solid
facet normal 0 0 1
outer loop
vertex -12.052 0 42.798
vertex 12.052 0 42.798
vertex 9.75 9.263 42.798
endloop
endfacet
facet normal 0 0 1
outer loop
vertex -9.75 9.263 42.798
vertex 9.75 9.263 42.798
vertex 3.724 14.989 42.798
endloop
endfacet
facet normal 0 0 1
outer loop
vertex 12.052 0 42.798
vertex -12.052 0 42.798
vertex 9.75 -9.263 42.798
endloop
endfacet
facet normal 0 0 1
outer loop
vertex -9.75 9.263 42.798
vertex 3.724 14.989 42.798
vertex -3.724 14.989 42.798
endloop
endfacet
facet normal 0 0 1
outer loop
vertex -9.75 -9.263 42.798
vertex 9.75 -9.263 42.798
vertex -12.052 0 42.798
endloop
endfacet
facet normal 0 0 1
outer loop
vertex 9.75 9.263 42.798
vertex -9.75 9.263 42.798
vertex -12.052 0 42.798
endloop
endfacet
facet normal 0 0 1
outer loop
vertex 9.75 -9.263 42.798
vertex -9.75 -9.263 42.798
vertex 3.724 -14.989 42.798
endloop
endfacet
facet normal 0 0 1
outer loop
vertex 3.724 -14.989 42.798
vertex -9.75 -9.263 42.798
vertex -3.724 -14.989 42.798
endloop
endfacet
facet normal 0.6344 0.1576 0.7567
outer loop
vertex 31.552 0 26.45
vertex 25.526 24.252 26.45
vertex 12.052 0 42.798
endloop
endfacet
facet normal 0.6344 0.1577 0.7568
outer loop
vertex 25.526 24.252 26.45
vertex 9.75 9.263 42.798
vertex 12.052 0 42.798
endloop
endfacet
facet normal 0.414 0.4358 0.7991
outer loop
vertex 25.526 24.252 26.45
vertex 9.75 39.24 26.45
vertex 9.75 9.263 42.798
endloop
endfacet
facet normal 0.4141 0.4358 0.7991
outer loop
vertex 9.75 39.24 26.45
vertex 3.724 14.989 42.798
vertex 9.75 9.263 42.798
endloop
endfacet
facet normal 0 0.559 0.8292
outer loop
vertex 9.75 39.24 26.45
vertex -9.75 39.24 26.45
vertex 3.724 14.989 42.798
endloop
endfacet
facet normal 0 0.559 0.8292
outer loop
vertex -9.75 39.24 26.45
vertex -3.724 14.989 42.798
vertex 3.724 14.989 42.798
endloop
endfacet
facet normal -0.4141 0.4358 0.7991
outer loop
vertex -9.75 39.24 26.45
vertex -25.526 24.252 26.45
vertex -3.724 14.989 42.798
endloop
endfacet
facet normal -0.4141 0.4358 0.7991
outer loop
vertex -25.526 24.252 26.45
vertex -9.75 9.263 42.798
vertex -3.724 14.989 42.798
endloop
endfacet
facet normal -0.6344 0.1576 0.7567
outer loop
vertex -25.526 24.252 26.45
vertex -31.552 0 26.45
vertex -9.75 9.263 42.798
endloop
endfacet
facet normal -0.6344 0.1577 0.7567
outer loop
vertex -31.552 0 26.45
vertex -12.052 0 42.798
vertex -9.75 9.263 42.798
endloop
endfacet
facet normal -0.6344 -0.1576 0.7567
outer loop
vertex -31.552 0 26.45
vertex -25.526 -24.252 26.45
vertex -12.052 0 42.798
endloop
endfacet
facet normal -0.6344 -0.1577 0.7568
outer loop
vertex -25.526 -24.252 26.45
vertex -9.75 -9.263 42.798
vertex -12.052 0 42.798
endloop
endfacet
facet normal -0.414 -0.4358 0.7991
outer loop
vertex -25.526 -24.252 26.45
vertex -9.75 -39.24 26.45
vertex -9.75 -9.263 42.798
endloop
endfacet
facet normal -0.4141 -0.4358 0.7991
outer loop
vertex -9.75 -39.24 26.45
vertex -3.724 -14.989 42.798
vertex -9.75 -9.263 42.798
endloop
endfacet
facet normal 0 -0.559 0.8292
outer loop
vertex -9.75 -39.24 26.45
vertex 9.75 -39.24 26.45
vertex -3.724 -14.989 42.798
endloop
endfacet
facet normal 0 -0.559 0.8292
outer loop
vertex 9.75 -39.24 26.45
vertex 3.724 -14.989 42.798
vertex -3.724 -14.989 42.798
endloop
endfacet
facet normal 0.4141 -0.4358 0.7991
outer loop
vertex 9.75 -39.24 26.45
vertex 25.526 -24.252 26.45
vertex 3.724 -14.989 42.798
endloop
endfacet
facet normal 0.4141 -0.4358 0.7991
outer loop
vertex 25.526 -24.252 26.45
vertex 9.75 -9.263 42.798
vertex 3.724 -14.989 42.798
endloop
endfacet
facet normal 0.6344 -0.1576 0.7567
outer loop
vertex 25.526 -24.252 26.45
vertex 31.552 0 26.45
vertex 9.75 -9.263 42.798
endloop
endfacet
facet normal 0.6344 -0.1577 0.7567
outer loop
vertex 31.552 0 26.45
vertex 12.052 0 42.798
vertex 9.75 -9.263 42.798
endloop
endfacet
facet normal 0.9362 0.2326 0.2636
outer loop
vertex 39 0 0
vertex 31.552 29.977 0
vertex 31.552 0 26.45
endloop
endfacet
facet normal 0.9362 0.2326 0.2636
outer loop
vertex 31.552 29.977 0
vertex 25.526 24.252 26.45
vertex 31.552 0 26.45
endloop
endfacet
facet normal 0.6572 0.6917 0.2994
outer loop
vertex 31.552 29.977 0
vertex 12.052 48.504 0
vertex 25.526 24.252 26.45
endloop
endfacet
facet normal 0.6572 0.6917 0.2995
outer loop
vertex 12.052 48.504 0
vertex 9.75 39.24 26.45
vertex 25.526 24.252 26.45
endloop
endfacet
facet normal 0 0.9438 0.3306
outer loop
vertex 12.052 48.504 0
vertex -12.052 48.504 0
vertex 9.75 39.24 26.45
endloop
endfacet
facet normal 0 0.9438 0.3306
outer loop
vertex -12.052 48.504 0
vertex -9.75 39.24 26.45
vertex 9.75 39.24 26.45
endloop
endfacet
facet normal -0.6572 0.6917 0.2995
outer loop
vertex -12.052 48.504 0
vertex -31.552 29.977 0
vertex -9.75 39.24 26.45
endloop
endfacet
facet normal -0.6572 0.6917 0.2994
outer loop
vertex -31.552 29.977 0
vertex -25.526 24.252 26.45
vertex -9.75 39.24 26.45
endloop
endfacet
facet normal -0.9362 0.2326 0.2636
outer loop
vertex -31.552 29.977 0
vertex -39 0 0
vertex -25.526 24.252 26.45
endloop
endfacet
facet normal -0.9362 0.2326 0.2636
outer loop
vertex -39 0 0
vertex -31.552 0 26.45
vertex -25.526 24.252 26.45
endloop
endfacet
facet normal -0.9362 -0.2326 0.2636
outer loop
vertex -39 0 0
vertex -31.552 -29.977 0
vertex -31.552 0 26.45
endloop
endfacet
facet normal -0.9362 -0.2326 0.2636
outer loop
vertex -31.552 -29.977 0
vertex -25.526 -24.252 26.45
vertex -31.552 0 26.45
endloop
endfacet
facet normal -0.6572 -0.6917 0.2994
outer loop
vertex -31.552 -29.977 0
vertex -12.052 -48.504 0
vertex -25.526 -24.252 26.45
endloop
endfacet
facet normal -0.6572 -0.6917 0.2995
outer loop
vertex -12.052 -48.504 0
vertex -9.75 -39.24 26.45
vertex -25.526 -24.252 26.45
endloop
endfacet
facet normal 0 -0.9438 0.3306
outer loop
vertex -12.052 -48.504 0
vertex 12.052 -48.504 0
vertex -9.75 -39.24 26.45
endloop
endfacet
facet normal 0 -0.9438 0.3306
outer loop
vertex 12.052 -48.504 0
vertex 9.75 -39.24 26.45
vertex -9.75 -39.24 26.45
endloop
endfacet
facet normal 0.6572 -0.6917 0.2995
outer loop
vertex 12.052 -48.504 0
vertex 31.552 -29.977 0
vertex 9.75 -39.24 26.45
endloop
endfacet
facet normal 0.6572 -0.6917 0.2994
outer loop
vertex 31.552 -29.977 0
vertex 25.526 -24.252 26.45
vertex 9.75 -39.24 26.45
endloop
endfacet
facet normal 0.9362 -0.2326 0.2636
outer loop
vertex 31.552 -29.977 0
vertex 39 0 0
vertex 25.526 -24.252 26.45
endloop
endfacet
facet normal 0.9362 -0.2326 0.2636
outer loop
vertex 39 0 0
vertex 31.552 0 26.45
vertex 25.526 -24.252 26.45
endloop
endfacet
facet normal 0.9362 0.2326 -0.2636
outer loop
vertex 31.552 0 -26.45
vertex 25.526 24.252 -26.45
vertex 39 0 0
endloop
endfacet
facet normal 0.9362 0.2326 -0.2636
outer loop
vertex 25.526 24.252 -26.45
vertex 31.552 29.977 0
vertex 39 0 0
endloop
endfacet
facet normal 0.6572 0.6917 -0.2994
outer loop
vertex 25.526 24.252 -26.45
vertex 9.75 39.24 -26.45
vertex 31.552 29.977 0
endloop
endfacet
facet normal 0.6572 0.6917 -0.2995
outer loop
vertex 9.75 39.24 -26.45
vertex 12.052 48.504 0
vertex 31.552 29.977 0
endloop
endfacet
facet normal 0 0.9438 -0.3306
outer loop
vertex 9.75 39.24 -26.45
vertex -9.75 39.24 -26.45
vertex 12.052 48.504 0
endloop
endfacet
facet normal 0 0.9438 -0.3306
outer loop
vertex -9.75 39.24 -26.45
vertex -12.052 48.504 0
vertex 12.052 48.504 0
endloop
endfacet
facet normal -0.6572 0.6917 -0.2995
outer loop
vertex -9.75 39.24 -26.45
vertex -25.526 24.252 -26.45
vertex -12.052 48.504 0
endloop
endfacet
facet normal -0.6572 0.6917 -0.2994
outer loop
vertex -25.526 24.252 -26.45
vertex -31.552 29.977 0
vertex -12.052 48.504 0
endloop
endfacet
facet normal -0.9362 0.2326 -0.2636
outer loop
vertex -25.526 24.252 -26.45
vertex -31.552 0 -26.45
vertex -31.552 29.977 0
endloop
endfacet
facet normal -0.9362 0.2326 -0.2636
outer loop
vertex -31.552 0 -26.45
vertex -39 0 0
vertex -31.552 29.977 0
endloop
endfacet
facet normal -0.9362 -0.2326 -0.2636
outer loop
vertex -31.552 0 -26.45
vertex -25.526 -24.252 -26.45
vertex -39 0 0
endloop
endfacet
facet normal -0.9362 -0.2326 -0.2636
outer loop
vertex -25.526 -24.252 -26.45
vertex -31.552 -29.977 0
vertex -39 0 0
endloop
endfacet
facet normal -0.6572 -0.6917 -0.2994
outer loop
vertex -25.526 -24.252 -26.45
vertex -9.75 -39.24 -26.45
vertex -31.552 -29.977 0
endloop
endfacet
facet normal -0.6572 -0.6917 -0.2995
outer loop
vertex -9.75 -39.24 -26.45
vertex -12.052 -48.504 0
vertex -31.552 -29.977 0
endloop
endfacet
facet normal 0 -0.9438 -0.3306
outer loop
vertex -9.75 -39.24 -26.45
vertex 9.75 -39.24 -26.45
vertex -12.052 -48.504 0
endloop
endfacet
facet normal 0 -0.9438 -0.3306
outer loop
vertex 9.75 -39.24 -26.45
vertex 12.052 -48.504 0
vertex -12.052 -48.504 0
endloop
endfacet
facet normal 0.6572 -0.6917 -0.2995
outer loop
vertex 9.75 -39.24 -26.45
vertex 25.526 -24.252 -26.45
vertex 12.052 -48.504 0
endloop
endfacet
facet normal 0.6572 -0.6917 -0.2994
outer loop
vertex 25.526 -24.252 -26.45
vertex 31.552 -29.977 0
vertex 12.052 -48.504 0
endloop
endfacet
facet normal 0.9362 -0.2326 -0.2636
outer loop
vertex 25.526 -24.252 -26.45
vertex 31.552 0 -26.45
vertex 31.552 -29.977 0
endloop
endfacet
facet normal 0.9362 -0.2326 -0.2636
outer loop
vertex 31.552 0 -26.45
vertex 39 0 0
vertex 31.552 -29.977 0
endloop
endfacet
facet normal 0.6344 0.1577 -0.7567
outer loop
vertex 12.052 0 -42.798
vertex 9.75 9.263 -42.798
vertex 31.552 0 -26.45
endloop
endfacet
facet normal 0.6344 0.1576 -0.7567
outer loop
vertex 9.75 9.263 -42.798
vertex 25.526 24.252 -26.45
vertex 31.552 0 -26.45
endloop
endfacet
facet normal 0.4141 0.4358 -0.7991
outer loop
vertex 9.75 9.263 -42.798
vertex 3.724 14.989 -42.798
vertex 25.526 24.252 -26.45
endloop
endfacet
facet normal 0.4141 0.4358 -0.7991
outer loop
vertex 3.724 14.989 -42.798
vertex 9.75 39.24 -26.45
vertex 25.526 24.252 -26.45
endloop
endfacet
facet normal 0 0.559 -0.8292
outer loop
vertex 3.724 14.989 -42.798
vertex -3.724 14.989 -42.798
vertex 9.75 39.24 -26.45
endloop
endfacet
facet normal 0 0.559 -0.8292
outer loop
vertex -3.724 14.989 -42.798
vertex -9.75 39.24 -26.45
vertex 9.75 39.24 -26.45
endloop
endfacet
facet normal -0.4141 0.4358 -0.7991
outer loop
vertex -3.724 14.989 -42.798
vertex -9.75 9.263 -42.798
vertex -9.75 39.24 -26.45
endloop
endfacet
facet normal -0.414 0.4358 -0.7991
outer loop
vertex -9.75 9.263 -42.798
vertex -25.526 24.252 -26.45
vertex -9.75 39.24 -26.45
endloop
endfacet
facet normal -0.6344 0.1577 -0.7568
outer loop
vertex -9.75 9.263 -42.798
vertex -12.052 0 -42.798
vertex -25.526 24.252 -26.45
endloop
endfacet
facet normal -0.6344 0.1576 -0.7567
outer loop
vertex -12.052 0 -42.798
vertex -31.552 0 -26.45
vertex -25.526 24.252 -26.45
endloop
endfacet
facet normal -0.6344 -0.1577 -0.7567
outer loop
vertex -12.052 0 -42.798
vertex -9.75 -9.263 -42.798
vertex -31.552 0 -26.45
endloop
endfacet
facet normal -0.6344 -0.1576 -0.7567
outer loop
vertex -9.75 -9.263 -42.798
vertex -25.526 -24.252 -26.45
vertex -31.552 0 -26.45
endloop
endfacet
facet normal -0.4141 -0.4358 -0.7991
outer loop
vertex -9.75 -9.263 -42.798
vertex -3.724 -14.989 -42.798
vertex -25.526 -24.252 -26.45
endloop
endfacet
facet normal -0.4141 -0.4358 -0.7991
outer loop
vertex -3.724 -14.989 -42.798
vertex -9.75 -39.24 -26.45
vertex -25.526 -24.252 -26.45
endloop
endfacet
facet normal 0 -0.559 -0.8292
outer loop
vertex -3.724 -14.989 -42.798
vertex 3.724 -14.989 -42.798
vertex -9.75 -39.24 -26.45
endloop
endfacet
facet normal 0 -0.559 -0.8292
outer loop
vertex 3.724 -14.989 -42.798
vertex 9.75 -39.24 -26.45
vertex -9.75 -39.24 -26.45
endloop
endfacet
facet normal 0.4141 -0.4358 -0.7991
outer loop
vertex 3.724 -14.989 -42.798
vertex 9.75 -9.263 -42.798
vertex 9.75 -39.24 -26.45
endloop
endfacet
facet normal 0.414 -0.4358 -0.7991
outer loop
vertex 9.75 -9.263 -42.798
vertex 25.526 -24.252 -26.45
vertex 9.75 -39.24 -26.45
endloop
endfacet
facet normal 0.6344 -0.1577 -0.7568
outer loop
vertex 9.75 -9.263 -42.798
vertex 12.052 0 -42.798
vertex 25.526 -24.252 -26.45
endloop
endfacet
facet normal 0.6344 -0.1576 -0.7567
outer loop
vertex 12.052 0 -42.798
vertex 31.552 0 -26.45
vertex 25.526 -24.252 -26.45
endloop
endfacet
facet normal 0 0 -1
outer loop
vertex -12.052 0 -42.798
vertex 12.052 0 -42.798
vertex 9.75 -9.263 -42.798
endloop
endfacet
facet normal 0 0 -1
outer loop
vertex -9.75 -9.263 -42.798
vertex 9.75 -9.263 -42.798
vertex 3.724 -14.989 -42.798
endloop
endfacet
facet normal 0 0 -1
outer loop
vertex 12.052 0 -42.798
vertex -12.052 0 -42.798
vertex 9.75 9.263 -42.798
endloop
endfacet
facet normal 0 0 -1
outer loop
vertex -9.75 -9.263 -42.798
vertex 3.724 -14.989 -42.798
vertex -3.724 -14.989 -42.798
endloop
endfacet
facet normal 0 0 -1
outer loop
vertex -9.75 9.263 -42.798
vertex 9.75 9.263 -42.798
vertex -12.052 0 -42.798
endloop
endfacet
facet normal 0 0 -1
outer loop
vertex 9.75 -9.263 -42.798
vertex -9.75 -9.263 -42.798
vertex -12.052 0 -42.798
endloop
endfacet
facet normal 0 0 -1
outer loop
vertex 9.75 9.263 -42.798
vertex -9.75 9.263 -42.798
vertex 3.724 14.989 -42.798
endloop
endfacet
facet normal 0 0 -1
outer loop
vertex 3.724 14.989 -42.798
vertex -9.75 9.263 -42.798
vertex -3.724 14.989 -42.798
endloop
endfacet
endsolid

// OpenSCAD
// Generated by SolidPython 1.0.1 on 2020-07-29 00:46:51


scale(v = [13, 17, 15]) {
	sphere(r = 3);
}
/***********************************************
*********      SolidPython code:      **********
************************************************
 
# import packages: SolidPython
from solid import *
from solid.utils import *
from itertools import chain, combinations, permutations


class Resize:

    def __init__(self, scad_file):
        self.scad_file = scad_file
        #self.scad_file = import_scad(scad_file)
        # cone/cylinder param:
        self.r1 = 0
        self.r2 = 0
        self.h = 0
        # rectangular prism param:
        self.w = 0
        self.l = 0
        # ellipse param:
        self.r = 0

    # import OpenScad code (file name corresponds to shape)


    # classify shape + parameters
    def assign(self, param1, param2, param3):
        if self.scad_file == 'cone.scad':
            self.r1 = param1
            self.r2 = param2
            self.h = param3
        elif self.scad_file == 'cylinder.scad':
            self.r1 = param1
            self.r2 = param2
            self.h = param3
        elif self.scad_file == 'rectangularPrism.scad':
            self.h = param1
            self.l = param2
            self.w = param3
        else:
            self.r = param1
            self.h = param2

    # resize parameters
    def iterate(self):
        x = range(3, 20, 2)
        i = 1
        if self.scad_file == 'cone.scad':
            tempList = list(permutations(x, 2))
            for temp in tempList:
                param1 = temp[0]
                param2 = temp[1]
                filepath = 'produced_scad_files/' + 'cone' + str(param1) + '_' + str(param2) + '_' + '.scad'
                scad_render_to_file(cylinder(h=param1, r1=param2, r2=0), filepath)

        elif self.scad_file == 'cylinder.scad':
            tempList = list(permutations(x, 3))
            for temp in tempList:
                param1 = temp[0]
                param2 = temp[1]
                filepath = 'produced_scad_files/' + 'cylinder' + str(param1) + '_' + str(param2) + '_' + '.scad'
                scad_render_to_file(cylinder(h=param1, r1=param2, r2=param2), filepath)

        elif self.scad_file == 'rectangularPrism.scad':
            tempList = list(permutations(x, 3))
            for temp in tempList:
                param1 = temp[0]
                param2 = temp[1]
                param3 = temp[2]
                filepath = 'produced_scad_files/' + 'rectangularPrism' + str(param1) + '_' + str(param2) + '_' + str(
                    param3) + '.scad'
                scad_render_to_file(cube(size=(param1, param2, param3)), filepath)

        elif self.scad_file == 'ellipse.scad':
            tempList = list(permutations(x, 4))
            for temp in tempList:
                param1 = temp[0]
                param2 = temp[1]
                param3 = temp[2]
                param4 = temp[3]
                filepath = 'produced_scad_files/' + 'ellipse' + str(param1) + '_' + str(param2) + '_' + str(param3) + '_' + str(param4) + '.scad'
                scad_render_to_file(scale([param1, param2, param3])(sphere(r=param4)), filepath)

    def render_to_scadfile(self):
        scad_render_to_file(scad, 'example.scad') 
 
************************************************/
